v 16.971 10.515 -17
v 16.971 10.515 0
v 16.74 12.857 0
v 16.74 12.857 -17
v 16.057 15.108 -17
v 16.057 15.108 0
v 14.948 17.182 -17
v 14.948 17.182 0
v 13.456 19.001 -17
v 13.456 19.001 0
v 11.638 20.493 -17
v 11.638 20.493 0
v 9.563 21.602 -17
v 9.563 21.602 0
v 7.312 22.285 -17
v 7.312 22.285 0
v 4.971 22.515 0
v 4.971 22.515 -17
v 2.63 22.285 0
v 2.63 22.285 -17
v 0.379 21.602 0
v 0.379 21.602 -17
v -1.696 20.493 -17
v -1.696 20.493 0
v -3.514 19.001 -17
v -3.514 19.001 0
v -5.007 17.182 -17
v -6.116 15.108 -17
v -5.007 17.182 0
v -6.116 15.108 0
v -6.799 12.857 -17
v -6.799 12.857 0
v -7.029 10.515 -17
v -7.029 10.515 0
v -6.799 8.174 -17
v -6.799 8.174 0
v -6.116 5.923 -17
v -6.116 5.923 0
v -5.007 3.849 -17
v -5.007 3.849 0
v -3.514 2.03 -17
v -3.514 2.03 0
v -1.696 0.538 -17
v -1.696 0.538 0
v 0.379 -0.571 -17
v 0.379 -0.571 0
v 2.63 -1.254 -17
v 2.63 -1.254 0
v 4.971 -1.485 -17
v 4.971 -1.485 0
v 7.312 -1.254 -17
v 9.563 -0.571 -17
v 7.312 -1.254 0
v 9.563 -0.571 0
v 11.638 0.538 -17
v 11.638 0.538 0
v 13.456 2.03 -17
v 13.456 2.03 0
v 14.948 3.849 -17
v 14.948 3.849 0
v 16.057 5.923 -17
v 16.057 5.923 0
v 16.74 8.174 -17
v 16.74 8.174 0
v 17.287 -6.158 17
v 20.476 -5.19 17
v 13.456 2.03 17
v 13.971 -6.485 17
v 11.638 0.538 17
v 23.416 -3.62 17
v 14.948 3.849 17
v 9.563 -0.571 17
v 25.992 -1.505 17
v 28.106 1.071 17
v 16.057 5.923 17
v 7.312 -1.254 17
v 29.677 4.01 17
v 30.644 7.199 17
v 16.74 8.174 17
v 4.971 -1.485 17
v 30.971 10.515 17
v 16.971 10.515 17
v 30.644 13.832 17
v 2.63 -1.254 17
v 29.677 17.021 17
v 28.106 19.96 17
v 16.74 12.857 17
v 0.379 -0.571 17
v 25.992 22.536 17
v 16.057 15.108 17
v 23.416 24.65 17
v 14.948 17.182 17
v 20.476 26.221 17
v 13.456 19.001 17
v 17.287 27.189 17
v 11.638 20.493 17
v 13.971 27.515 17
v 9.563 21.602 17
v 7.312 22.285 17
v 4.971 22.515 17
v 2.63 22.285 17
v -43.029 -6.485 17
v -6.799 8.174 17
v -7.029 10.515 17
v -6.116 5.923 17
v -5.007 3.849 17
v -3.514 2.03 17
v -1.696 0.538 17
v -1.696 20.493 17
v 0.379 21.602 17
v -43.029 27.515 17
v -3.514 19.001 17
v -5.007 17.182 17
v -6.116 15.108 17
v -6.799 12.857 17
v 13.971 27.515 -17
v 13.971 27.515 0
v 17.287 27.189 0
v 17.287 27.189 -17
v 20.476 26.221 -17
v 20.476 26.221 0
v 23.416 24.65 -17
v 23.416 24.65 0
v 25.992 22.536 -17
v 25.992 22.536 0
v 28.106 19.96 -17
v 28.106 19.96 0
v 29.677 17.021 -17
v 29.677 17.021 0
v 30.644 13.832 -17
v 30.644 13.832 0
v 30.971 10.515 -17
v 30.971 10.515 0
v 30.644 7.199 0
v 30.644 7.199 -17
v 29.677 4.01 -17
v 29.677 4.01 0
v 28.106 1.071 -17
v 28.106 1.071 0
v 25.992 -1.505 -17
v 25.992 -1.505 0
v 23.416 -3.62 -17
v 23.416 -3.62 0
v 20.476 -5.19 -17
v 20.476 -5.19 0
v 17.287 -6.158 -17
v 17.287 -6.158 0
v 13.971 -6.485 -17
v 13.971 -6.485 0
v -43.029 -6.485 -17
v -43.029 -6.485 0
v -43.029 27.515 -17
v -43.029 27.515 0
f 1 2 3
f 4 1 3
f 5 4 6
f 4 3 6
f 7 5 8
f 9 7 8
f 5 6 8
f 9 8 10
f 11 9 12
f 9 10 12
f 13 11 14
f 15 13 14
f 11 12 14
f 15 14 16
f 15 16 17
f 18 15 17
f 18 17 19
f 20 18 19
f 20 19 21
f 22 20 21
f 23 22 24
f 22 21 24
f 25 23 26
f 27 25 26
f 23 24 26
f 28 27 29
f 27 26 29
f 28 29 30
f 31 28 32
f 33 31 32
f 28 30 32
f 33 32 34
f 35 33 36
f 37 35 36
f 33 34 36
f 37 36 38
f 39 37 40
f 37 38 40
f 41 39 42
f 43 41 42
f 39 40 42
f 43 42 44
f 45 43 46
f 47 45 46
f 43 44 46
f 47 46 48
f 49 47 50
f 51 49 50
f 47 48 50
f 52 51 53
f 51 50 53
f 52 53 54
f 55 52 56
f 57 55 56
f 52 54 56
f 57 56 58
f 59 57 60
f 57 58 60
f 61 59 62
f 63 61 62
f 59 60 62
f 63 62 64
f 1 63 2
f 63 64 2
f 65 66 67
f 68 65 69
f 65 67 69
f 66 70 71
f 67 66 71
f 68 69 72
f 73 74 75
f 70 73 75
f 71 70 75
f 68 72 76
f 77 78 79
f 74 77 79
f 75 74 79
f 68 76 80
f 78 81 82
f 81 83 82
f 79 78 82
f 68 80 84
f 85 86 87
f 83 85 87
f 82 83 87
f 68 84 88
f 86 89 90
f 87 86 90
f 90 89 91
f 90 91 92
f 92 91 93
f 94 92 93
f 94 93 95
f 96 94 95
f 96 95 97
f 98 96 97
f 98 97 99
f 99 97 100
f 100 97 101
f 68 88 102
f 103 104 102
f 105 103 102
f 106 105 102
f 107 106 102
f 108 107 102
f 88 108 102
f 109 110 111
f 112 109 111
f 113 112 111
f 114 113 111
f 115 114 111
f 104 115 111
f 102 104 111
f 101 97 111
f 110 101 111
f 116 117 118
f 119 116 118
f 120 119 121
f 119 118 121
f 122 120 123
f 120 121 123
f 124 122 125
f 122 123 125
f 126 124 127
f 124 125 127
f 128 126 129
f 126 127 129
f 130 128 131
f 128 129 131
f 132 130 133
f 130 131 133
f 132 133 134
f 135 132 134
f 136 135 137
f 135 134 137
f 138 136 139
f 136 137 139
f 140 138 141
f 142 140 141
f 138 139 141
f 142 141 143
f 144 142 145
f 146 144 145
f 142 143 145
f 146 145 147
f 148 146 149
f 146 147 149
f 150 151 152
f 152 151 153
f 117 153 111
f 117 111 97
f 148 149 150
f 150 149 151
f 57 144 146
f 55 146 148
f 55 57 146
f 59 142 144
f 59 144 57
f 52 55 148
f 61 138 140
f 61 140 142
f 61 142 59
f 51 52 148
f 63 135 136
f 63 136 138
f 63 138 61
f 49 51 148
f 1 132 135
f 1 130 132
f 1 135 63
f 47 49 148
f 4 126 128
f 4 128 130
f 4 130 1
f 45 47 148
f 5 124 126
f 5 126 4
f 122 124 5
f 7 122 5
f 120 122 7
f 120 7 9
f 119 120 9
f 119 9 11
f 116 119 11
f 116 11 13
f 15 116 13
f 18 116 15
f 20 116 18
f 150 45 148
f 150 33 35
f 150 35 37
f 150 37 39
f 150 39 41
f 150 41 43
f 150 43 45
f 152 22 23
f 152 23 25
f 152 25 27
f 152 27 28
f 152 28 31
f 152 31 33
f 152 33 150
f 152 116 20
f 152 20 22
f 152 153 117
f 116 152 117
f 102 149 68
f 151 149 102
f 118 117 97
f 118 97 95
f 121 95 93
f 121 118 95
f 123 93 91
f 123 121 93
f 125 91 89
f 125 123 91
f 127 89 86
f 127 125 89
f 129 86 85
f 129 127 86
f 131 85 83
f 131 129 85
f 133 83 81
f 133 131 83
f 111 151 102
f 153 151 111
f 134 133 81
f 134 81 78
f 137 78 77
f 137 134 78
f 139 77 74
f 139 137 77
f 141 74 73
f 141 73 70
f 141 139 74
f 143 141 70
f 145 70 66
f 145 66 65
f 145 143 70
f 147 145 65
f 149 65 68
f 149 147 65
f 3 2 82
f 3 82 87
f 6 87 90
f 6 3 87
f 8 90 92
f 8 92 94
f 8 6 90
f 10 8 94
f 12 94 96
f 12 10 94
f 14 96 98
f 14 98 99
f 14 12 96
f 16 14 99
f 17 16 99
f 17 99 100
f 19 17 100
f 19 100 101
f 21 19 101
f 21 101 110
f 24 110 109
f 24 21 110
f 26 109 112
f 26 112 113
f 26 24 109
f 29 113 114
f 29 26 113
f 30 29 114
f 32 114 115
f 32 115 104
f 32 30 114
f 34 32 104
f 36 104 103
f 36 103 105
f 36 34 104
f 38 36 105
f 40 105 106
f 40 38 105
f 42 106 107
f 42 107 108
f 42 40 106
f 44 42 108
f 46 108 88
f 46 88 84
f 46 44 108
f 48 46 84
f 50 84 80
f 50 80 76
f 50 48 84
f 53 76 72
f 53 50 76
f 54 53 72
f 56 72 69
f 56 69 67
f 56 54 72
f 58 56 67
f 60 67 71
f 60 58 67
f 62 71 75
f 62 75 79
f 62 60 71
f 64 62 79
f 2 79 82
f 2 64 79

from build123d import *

# Parameters (mm, degrees)
DODANIE_WYCI_GNI_CIE6_DEPTH      = 17
DODANIE_WYCI_GNI_CIE6_DEPTH_BACK = 17
SZKIC1_R                         = 12


with BuildPart() as part:
    # Szkic1 → Dodanie-wyciągnięcie6 (new, two sides: drawn at the far end of the back side and taken through both)
    with BuildSketch(Plane.XY.offset(-DODANIE_WYCI_GNI_CIE6_DEPTH_BACK)):
        with BuildLine():
            Line((4.970807503, 27.515463918), (-43.029192497, 27.515463918))
            Line((-43.029192497, 27.515463918), (-43.029192497, -6.484536082))
            Line((-43.029192497, -6.484536082), (4.970807503, -6.484536082))
            Line((4.970807503, -6.484536082), (13.970807503, -6.484536082))
            ThreePointArc((13.970807503, -6.484536082), (25.991622783, -1.505351363), (30.970807503, 10.515463918))
            ThreePointArc((30.970807503, 10.515463918), (25.991622783, 22.536279198), (13.970807503, 27.515463918))
            Line((13.970807503, 27.515463918), (4.970807503, 27.515463918))
        make_face()
        with Locations((4.970807503, 10.515463918)):
            Circle(SZKIC1_R, mode=Mode.SUBTRACT)
    extrude(amount=DODANIE_WYCI_GNI_CIE6_DEPTH + DODANIE_WYCI_GNI_CIE6_DEPTH_BACK)


solid = part.part
